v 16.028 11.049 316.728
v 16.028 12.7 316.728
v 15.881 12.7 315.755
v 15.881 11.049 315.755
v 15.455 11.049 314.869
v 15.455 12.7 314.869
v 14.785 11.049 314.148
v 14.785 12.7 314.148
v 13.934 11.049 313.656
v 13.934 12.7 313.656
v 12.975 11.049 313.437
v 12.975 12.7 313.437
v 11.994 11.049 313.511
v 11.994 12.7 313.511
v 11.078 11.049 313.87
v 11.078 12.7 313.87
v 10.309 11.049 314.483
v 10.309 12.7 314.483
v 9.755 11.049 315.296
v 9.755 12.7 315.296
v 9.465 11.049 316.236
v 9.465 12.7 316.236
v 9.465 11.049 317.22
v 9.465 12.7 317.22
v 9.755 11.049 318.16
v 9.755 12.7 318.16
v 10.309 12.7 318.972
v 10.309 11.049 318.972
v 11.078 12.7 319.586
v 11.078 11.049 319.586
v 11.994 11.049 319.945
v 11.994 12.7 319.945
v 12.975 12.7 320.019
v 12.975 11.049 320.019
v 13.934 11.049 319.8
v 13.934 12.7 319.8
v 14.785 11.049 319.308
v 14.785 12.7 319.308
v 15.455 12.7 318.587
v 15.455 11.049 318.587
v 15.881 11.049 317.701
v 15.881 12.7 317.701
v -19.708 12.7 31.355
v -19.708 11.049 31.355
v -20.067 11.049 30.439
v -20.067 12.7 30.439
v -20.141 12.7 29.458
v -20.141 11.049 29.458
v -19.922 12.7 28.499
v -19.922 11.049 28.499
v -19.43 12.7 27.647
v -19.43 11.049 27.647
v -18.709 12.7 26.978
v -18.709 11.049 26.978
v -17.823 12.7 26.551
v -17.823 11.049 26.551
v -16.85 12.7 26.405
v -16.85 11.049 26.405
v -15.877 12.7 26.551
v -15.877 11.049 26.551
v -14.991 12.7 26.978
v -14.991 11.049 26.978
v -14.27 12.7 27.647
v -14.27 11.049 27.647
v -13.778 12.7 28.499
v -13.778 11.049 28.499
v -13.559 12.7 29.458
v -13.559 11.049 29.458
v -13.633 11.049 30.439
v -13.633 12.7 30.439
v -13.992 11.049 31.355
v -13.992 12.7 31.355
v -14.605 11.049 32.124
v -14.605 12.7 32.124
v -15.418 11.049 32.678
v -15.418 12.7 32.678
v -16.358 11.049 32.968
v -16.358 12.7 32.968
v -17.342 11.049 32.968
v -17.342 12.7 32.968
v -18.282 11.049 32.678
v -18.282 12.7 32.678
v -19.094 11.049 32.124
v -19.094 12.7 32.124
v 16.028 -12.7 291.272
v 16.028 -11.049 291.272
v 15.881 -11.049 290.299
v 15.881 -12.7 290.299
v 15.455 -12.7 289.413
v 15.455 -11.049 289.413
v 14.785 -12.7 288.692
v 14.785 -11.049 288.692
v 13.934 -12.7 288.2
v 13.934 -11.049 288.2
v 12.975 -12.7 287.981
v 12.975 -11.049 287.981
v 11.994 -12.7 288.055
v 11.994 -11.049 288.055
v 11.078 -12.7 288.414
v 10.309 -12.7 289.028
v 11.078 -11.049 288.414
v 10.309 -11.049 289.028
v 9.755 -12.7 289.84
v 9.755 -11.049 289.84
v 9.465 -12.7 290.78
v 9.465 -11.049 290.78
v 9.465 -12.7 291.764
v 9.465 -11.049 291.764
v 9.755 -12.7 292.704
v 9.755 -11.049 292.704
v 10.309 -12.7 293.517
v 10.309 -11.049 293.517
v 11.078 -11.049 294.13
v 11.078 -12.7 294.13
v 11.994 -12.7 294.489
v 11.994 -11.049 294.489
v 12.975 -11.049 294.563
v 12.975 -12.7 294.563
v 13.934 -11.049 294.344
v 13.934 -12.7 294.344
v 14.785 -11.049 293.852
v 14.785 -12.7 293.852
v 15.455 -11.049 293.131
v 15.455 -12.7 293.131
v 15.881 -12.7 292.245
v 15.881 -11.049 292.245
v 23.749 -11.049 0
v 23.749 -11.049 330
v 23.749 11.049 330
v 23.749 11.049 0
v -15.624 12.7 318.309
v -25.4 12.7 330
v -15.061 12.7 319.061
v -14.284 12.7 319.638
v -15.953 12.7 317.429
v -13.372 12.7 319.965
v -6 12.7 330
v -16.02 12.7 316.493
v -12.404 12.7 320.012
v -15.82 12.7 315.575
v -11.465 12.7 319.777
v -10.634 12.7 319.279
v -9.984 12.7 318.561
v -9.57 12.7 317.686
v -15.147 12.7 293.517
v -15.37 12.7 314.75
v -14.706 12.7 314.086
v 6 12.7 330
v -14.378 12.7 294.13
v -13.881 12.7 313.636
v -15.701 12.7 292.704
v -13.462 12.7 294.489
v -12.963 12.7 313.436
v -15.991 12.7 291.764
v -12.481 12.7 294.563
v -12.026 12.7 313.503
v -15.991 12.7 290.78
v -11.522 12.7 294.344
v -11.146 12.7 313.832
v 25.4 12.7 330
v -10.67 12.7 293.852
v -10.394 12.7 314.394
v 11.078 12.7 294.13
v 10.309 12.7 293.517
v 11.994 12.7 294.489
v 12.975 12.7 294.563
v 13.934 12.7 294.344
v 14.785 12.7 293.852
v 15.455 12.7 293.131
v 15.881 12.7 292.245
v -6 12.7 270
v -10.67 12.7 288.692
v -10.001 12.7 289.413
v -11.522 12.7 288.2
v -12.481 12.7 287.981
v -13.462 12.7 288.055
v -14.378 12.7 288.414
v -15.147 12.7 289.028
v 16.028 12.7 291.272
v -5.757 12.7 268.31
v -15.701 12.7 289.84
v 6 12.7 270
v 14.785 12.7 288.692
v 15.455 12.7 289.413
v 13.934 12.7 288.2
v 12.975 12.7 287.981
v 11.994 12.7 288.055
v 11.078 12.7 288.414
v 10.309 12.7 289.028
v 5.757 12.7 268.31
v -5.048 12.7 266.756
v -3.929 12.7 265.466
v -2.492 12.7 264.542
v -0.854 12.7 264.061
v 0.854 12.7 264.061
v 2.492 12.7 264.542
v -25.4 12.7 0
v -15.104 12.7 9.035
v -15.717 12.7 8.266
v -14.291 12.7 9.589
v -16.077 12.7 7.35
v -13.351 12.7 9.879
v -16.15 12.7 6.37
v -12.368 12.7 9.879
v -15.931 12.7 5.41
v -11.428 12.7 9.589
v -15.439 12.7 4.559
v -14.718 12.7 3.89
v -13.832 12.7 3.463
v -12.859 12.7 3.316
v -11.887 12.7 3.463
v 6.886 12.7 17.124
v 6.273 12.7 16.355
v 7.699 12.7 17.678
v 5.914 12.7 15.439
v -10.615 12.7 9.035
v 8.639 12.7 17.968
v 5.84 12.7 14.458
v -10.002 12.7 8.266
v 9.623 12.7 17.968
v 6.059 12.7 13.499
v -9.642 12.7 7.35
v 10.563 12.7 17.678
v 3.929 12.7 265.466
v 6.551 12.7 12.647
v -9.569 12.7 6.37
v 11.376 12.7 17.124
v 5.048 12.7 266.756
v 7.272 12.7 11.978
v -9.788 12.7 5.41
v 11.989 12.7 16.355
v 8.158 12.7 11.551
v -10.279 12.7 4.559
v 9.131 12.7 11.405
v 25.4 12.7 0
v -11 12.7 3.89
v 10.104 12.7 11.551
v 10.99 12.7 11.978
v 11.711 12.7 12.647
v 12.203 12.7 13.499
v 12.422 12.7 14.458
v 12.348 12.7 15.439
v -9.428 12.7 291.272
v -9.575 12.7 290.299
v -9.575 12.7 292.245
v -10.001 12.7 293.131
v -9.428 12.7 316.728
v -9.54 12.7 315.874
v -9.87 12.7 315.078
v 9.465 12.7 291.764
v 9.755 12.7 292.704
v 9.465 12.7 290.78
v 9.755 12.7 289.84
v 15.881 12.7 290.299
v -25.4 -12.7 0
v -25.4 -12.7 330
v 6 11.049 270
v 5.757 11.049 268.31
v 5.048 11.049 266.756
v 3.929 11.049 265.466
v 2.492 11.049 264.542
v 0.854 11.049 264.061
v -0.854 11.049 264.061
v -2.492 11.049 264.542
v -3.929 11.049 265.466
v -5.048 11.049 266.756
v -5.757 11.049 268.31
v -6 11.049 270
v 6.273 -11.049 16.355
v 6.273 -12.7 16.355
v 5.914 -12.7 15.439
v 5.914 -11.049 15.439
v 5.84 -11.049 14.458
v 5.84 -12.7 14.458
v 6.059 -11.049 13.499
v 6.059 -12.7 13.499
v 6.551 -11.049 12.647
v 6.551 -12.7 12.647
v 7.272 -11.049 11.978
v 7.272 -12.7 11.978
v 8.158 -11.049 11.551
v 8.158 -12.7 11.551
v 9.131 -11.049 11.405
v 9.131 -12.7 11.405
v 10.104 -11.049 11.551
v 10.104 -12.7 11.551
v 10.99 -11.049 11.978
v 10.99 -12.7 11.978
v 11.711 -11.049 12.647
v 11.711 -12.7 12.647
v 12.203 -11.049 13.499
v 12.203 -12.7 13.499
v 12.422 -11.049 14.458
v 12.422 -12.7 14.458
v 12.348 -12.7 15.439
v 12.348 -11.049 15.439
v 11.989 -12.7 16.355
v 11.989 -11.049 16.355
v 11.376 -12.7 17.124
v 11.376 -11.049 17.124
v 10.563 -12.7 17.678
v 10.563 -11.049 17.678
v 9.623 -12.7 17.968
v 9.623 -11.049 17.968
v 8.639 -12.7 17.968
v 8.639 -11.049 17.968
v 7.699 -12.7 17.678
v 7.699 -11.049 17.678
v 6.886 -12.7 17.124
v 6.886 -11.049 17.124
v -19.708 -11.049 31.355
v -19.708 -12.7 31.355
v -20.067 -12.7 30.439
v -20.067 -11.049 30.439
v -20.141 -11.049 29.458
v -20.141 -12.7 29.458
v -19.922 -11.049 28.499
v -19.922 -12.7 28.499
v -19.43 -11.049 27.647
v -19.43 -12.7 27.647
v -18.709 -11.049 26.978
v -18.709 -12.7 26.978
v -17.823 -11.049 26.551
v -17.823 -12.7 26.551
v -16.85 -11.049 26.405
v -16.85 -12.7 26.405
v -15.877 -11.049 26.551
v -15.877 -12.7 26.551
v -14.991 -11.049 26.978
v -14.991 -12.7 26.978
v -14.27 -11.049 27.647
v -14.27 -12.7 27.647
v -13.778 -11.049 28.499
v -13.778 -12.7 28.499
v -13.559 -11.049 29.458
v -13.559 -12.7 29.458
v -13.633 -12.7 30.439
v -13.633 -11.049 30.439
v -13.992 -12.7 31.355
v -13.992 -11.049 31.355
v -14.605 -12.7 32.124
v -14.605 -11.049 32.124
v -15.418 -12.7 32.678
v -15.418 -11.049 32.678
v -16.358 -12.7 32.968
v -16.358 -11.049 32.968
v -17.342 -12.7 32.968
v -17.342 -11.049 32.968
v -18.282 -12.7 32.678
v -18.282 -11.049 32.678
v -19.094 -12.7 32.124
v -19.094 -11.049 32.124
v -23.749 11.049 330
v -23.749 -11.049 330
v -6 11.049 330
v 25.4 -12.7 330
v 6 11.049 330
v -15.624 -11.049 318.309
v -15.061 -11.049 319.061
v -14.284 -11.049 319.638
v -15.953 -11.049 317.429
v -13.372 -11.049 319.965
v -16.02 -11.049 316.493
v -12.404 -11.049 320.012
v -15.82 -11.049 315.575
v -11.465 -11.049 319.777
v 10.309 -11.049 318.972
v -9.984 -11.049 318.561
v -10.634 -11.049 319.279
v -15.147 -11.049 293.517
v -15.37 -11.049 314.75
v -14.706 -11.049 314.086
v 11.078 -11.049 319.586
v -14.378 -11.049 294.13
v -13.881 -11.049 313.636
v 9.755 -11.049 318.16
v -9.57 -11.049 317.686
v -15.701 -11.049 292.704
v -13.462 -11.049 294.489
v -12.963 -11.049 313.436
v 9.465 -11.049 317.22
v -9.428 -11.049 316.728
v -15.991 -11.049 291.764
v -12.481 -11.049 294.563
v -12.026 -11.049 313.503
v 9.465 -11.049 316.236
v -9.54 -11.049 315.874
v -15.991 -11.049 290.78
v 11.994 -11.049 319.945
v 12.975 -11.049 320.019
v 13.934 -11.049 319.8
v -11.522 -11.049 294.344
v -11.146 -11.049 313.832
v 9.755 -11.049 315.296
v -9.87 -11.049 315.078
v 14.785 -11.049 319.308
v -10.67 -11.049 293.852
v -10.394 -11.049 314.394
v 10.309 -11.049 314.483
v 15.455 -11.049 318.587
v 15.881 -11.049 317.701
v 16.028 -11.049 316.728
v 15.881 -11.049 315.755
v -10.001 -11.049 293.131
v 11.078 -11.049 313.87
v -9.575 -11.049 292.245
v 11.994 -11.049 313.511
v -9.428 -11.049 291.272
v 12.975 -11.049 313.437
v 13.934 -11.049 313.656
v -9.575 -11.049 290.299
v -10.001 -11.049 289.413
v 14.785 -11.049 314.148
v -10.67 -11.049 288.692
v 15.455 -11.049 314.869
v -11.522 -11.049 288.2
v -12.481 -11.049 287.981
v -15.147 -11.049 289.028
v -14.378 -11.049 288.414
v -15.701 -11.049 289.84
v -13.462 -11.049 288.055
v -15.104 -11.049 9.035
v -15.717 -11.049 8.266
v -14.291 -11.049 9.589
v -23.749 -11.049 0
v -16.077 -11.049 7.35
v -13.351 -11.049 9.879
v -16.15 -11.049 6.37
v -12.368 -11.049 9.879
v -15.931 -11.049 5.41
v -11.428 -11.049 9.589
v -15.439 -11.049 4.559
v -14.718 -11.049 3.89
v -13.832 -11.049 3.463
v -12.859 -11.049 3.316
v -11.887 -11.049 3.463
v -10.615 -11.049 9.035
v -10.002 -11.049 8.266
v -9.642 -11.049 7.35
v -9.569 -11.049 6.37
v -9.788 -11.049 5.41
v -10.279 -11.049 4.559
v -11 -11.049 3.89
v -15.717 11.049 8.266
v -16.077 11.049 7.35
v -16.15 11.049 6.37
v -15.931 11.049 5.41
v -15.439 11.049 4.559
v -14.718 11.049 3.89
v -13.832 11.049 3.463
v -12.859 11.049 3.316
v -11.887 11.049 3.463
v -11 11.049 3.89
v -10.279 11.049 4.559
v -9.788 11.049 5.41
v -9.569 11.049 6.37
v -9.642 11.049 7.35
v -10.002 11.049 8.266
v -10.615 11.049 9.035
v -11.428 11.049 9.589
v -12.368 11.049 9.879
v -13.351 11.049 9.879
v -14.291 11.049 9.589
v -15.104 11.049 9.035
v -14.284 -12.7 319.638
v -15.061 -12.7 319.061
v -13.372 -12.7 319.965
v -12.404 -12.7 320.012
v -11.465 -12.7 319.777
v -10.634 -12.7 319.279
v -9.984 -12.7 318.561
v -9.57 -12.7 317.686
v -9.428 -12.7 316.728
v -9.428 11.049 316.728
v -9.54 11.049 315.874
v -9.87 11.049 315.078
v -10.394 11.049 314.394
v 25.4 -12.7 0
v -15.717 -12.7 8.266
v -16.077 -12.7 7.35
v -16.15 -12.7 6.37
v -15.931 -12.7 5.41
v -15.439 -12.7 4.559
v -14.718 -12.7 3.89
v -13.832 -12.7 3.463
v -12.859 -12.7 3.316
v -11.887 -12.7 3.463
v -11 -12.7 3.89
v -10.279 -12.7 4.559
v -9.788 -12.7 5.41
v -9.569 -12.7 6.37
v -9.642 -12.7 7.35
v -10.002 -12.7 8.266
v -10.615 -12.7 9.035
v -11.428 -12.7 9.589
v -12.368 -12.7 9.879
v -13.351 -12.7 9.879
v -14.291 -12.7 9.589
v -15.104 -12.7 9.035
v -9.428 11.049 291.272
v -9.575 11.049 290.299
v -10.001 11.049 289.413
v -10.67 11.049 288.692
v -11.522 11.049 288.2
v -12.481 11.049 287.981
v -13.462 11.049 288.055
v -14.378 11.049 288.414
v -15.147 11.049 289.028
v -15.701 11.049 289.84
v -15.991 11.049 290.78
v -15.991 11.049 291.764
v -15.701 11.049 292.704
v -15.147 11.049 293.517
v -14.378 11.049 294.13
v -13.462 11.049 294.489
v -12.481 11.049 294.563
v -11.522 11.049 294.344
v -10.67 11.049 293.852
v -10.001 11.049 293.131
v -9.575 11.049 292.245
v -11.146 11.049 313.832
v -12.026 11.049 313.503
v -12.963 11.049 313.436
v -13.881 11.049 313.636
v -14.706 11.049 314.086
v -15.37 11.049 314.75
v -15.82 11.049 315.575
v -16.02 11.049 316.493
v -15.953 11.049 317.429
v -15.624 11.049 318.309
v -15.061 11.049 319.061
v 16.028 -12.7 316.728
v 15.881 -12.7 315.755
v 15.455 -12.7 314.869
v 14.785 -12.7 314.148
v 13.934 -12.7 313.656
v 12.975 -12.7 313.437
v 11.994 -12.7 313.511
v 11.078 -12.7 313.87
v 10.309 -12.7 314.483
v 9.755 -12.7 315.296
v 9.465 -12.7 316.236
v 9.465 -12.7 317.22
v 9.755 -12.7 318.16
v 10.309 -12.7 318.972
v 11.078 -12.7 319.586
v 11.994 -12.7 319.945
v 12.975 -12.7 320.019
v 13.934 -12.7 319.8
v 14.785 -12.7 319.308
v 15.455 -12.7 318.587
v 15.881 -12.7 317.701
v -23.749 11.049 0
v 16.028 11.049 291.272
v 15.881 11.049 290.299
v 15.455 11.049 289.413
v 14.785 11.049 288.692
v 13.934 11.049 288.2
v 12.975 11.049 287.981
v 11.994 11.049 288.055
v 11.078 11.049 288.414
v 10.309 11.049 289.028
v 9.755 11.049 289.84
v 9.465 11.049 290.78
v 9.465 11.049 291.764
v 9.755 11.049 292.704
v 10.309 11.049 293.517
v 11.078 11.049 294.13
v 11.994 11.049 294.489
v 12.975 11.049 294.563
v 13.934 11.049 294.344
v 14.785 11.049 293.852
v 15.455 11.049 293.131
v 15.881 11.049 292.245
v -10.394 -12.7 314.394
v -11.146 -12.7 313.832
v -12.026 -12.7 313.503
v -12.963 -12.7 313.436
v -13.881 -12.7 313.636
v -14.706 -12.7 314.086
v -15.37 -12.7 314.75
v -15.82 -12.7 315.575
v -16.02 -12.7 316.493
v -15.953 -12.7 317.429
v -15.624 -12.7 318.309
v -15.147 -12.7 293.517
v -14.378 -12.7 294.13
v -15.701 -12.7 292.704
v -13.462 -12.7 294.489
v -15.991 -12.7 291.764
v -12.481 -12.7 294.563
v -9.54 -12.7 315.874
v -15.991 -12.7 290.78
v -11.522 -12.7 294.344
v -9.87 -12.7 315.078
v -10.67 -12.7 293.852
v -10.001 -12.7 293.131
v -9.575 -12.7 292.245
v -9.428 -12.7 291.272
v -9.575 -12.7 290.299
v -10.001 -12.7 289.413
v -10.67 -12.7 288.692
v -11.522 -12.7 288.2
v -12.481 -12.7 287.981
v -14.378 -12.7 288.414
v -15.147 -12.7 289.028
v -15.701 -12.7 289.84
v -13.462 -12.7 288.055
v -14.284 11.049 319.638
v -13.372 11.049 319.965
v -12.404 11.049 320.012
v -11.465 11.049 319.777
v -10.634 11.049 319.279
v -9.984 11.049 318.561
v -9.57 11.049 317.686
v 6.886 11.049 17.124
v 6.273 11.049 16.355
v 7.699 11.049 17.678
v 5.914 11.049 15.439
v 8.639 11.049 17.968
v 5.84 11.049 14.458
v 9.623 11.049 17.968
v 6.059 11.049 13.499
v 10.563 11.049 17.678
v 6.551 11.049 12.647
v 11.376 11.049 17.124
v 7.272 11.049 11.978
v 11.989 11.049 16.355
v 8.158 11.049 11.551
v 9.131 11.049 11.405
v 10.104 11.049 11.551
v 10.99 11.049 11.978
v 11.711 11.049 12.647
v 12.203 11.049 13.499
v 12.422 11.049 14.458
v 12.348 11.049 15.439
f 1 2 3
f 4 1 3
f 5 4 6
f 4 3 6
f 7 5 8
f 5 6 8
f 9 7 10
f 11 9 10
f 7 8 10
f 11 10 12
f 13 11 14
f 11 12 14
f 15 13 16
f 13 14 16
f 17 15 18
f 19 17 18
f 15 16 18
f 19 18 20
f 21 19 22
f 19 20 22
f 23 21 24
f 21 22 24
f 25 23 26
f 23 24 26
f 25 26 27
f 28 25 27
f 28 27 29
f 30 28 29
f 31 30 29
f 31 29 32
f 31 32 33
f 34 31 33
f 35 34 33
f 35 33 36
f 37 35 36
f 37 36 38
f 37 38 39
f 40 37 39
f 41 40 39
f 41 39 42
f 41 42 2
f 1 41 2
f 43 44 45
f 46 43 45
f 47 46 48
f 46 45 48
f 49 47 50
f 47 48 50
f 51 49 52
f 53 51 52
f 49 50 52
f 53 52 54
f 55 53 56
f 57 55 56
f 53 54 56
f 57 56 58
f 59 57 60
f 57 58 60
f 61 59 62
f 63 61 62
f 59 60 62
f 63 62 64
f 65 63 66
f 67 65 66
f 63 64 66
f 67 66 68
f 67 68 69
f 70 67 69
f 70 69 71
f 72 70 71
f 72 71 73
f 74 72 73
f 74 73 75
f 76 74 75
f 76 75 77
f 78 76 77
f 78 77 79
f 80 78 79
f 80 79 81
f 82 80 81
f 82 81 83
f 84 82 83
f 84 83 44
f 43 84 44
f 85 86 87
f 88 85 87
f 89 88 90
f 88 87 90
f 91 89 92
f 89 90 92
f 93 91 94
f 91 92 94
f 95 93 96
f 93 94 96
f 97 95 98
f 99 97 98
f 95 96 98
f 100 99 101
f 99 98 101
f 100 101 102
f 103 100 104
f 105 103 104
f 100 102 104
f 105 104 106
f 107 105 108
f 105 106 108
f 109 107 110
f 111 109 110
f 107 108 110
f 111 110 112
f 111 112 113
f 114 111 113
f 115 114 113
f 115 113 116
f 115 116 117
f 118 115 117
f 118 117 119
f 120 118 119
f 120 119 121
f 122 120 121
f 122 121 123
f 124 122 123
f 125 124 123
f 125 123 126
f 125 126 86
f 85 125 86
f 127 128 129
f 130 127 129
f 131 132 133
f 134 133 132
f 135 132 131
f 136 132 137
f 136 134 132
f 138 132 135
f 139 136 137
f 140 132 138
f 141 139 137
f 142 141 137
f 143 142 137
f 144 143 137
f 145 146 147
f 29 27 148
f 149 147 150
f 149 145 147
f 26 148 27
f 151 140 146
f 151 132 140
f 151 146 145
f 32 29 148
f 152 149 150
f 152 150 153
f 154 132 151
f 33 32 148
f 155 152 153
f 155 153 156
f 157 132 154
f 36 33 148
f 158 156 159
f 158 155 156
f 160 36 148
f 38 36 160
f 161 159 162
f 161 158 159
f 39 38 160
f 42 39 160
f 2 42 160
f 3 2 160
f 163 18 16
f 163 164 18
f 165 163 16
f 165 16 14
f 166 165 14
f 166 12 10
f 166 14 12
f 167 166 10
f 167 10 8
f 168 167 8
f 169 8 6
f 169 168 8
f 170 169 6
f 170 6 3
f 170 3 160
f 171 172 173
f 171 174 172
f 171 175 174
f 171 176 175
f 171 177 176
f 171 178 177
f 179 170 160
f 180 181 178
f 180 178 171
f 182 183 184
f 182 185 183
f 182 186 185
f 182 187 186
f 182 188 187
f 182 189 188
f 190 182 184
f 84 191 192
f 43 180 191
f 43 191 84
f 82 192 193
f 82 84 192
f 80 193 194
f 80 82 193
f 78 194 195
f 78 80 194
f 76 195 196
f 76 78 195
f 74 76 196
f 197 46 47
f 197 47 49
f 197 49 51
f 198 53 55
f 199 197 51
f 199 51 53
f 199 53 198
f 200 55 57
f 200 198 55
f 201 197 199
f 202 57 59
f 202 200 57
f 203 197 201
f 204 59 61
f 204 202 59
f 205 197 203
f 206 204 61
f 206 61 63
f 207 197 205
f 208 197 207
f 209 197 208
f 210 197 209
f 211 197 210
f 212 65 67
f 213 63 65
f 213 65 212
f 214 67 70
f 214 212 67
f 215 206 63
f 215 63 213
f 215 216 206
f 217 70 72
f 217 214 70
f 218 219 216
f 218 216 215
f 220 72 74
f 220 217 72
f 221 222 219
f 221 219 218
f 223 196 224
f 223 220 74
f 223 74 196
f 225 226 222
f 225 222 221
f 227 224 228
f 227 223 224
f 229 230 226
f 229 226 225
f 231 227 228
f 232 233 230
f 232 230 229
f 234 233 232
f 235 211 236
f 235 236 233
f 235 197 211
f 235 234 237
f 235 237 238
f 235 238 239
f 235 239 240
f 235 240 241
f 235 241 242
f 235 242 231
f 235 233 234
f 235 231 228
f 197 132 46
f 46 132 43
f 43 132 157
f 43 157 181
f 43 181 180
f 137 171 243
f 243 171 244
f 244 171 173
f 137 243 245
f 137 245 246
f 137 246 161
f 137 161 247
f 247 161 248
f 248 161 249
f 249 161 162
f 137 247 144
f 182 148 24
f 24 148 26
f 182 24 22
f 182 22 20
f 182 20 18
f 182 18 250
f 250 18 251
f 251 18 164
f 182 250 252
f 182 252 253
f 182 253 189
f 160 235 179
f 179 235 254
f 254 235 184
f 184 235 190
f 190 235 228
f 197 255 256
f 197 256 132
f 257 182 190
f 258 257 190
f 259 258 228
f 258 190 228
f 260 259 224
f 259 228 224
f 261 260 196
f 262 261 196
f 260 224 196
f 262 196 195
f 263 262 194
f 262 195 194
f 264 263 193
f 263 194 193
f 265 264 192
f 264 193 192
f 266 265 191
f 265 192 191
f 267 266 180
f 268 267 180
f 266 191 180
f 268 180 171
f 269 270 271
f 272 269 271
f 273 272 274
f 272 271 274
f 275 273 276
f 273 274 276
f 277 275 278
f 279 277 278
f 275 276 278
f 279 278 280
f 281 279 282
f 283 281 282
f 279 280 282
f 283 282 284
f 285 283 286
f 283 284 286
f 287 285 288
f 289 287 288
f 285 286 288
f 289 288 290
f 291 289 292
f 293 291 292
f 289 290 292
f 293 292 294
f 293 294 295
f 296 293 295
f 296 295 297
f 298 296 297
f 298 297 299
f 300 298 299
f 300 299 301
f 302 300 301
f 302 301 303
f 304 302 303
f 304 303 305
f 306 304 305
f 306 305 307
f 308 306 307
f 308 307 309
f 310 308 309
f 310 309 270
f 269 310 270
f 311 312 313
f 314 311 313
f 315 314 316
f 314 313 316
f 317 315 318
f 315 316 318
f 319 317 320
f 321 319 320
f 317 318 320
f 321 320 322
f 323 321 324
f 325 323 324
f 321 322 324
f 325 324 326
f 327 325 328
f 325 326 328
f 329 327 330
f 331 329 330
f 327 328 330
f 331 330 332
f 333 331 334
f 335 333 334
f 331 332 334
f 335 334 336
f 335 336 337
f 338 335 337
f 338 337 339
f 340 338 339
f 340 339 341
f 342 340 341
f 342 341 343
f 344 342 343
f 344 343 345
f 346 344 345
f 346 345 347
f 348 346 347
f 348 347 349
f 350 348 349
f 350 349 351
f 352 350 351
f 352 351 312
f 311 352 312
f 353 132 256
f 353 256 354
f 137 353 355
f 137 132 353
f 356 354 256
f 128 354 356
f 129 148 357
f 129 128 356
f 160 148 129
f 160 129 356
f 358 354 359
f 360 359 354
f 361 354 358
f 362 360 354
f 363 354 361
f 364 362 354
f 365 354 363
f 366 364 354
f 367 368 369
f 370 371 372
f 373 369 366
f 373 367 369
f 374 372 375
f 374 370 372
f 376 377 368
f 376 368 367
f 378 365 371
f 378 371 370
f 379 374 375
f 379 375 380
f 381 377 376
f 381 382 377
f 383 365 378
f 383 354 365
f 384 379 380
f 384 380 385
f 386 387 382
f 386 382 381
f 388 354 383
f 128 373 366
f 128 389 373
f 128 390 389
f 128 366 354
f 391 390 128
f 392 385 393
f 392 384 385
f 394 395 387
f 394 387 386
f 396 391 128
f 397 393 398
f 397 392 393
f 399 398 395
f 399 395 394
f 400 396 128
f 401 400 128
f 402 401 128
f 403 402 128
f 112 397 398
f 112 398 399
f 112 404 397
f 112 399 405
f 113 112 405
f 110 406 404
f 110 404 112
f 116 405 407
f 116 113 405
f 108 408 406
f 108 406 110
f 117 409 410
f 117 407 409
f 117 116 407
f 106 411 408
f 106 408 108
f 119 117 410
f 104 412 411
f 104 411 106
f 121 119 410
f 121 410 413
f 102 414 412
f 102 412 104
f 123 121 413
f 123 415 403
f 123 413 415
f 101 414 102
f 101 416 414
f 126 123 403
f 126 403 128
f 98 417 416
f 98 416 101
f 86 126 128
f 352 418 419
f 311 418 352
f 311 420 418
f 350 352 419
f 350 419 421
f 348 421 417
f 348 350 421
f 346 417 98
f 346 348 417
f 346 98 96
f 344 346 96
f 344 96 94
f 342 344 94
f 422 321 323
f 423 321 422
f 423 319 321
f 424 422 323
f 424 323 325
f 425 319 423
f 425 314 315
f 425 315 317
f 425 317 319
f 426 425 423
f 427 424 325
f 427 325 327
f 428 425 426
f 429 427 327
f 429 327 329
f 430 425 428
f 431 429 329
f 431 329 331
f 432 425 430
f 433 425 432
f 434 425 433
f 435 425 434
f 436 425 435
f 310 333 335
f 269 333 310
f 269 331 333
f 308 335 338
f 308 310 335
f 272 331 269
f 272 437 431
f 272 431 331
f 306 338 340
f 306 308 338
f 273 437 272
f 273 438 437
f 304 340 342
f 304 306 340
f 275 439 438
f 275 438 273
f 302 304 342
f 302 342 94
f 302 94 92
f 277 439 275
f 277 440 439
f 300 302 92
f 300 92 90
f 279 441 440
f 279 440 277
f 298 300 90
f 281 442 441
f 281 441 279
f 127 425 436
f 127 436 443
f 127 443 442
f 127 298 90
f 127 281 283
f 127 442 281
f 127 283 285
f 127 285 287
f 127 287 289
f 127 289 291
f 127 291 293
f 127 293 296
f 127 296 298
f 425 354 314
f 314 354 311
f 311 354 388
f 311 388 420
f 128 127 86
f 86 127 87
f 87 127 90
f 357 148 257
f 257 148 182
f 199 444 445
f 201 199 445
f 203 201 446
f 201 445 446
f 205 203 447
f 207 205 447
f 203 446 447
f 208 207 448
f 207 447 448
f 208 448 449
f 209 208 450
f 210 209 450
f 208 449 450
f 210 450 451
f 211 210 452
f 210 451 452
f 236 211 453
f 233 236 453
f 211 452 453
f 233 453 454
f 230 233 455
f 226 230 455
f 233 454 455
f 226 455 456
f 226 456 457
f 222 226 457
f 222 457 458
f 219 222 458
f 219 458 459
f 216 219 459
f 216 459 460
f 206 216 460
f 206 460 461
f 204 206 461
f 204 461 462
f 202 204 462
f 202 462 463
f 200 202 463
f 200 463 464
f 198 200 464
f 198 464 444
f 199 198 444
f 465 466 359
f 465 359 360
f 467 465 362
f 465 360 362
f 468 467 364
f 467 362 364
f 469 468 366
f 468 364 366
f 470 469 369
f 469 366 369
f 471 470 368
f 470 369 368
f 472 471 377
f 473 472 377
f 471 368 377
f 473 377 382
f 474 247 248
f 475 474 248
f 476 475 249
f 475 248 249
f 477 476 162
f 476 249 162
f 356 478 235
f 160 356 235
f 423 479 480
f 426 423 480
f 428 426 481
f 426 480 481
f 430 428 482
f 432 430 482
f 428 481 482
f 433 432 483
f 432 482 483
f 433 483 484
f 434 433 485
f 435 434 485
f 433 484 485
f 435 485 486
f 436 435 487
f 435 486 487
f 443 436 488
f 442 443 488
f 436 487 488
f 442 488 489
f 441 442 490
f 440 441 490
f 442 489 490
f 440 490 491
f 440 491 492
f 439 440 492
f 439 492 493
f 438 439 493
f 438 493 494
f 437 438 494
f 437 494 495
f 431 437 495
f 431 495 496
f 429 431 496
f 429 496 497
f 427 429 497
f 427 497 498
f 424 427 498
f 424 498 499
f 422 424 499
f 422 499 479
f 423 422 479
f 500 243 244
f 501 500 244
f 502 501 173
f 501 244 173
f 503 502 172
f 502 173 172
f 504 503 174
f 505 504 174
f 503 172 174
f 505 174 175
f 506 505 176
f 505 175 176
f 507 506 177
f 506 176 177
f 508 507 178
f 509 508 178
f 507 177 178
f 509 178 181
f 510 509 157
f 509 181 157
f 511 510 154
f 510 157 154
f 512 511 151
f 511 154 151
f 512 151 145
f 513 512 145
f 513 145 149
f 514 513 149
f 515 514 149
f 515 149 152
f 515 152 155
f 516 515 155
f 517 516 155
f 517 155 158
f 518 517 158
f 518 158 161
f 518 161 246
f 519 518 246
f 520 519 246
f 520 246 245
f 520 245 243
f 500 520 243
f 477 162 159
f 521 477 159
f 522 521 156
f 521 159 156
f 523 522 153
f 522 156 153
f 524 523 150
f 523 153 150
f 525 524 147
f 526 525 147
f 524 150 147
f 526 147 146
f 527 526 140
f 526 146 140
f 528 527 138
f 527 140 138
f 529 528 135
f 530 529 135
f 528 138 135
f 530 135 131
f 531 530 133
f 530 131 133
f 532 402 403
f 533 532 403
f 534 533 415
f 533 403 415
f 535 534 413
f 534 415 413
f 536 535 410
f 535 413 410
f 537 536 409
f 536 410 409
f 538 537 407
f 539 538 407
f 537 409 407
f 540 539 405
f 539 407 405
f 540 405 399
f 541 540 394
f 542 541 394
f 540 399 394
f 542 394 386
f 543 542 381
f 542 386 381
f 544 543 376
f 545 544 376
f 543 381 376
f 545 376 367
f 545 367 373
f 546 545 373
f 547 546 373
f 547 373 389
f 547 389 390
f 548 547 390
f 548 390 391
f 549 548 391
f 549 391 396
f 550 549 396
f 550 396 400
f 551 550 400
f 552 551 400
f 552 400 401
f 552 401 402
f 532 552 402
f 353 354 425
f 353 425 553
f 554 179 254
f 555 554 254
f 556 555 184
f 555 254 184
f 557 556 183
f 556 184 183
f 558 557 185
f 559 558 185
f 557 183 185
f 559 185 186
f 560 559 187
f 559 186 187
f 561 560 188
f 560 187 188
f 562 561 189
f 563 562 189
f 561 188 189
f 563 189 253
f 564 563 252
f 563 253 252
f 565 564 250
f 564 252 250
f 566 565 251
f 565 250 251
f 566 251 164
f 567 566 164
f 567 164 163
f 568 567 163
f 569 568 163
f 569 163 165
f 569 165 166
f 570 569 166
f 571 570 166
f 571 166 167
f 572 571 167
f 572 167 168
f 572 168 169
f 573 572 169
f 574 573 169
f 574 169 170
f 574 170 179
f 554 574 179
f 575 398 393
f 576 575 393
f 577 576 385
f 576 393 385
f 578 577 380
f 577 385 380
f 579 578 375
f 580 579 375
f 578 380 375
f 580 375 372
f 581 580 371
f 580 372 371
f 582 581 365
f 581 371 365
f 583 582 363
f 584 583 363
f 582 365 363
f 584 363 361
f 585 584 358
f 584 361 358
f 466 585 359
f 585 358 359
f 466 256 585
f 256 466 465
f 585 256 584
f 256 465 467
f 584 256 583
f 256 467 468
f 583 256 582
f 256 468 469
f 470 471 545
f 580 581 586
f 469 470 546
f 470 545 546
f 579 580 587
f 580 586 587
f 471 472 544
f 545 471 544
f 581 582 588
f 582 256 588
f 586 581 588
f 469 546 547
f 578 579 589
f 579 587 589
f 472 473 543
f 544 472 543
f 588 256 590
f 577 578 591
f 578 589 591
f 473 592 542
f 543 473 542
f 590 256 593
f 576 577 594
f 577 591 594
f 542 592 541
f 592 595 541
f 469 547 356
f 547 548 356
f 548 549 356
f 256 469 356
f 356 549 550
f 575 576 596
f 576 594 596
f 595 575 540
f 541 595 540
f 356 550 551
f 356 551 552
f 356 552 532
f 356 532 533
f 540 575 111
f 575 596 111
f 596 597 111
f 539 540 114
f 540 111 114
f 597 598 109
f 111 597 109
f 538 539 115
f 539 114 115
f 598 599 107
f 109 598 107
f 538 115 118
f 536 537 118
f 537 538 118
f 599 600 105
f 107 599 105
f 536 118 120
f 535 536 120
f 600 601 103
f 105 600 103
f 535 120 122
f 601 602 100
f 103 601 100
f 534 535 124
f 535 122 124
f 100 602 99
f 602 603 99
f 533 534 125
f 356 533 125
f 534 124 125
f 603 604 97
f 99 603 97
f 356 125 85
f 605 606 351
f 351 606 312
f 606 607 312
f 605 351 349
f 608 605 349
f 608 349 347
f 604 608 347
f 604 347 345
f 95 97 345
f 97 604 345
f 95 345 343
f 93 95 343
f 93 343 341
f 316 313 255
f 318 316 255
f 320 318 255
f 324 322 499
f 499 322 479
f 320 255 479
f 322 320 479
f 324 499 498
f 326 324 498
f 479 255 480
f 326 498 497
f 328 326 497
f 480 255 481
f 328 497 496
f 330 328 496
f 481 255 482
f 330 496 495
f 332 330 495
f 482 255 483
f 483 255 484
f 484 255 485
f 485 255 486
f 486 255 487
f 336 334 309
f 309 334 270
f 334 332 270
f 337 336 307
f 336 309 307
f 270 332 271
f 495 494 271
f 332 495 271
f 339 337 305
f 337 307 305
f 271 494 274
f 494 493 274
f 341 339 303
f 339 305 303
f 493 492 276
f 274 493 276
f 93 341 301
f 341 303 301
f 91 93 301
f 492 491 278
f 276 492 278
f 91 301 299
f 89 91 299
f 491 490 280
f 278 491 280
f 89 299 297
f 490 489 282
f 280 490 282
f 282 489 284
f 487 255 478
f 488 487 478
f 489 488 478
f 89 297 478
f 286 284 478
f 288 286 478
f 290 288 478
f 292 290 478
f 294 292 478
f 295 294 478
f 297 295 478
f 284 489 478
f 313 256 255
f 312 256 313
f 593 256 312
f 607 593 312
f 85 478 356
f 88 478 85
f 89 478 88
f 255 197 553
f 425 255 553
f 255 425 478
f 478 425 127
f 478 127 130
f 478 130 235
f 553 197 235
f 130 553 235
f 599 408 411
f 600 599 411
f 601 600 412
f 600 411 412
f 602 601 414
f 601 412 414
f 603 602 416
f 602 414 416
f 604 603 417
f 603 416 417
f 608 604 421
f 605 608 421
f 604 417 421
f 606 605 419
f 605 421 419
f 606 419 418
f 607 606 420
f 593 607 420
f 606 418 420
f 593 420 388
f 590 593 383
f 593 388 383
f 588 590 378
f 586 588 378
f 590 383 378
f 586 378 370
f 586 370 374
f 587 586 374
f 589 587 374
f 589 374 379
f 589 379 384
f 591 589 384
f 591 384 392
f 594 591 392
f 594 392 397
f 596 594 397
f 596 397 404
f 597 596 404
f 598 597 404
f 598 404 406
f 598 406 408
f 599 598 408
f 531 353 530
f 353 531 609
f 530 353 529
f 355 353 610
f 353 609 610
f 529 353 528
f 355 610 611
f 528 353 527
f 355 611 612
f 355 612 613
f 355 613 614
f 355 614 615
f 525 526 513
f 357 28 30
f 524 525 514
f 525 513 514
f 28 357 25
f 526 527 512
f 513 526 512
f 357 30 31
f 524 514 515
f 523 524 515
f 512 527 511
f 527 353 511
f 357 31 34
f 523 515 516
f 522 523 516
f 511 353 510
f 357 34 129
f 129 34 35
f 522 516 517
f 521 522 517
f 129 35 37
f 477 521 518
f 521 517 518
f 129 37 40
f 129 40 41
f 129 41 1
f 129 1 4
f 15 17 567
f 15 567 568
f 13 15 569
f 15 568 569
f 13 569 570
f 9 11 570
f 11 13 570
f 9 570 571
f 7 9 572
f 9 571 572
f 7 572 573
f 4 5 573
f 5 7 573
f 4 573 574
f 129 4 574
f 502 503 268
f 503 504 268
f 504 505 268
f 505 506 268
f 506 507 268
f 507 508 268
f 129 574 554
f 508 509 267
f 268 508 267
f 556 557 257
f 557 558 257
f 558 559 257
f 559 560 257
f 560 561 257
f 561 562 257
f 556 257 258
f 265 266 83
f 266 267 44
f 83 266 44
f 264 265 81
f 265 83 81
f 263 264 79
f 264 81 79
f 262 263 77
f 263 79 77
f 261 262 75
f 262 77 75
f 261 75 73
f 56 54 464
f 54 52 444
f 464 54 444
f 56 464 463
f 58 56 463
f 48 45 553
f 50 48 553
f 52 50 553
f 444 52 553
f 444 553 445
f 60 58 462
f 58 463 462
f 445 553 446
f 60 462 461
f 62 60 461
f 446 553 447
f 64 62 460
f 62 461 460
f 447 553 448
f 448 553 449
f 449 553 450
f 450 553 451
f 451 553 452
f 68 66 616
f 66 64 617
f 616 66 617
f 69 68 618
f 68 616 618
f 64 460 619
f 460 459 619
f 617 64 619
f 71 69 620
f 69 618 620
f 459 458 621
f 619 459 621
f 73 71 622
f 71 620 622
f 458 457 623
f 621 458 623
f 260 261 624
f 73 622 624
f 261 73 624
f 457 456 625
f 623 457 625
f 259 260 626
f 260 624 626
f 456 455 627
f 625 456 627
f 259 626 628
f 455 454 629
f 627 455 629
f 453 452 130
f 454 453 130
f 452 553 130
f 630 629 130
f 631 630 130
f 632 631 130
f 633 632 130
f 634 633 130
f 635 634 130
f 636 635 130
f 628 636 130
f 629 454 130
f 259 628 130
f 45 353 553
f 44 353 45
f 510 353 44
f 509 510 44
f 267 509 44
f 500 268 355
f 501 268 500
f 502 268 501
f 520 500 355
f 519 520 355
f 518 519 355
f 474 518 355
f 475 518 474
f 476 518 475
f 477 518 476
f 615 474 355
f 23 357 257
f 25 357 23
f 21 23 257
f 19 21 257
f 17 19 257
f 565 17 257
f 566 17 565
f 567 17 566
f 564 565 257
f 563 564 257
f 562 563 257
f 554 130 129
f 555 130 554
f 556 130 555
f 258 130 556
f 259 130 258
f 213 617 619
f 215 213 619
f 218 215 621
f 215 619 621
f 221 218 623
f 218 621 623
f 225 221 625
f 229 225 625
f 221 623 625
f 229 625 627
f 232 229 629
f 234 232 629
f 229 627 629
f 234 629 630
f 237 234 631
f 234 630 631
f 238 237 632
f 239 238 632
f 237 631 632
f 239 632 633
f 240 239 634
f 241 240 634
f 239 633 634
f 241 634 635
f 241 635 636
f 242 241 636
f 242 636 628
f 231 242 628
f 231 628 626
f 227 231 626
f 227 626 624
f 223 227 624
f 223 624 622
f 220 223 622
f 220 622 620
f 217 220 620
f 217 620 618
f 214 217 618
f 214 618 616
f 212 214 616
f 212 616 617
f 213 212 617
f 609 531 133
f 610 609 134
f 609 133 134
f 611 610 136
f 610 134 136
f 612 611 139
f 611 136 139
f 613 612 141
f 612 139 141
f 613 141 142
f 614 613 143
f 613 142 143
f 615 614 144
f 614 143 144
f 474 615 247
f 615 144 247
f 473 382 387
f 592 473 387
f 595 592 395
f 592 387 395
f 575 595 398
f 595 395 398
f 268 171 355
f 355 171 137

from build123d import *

# Parameters (mm, degrees)
SKETCH1_W              = 50.8
SKETCH1_H              = 25.4
SKETCH1_W_2            = 47.498
SKETCH1_H_2            = 22.098
BOSS_EXTRUDE1_DEPTH    = 330
CUT_EXTRUDE5_REACH     = 27.4
SKETCH8_R              = 3.3
CUT_EXTRUDE6_DEPTH     = 26.4
F_00_CLEARANCE_HOLE1_D = 6.600000008


with BuildPart() as part:
    # Sketch1 → Boss-Extrude1 (new body)
    with BuildSketch(Plane.XY):
        Rectangle(SKETCH1_W, SKETCH1_H)
        Rectangle(SKETCH1_W_2, SKETCH1_H_2, mode=Mode.SUBTRACT)
    extrude(amount=BOSS_EXTRUDE1_DEPTH)

    # Sketch4 → Cut-Extrude5 (cut, up to next)
    with BuildSketch(Plane(origin=(0, 12.7, 0), x_dir=(1, 0, 0), z_dir=(0, 1, 0)), mode=Mode.PRIVATE) as cut_extrude5_sk1:
        with BuildLine():
            Line((-6, -270), (-6, -330))
            Line((-6, -330), (6, -330))
            Line((6, -330), (6, -270))
            ThreePointArc((6, -270), (0, -264), (-6, -270))
        make_face()
    cut_extrude5_tool1 = extrude(cut_extrude5_sk1.sketch, amount=-CUT_EXTRUDE5_REACH, mode=Mode.PRIVATE) & part.part
    add(cut_extrude5_tool1.solids().sort_by_distance((0, 12.7, 297.629949))[0], mode=Mode.SUBTRACT)

    # Sketch8 → Cut-Extrude6 (cut, through all)
    with BuildSketch(Plane(origin=(0, 12.7, 0), x_dir=(1, 0, 0), z_dir=(0, 1, 0))):
        with BuildLine():
            ThreePointArc((-9.427922061, -316.727922061), (-9.679119604, -315.465066735), (-10.394469683, -314.394469683))
            Line((-10.394469683, -314.394469683), (-15.061374439, -319.061374439))
            ThreePointArc((-15.061374439, -319.061374439), (-11.465066735, -319.776724519), (-9.427922061, -316.727922061))
        make_face()
        with BuildLine():
            Line((-15.061374439, -319.061374439), (-10.394469683, -314.394469683))
            ThreePointArc((-10.394469683, -314.394469683), (-15.061374439, -314.394469683), (-15.061374439, -319.061374439))
        make_face()
        with Locations((-12.727922061, -291.272077939)):
            Circle(SKETCH8_R)
        with Locations((12.727922061, -291.272077939)):
            Circle(SKETCH8_R)
        with Locations((12.727922061, -316.727922061)):
            Circle(SKETCH8_R)
    extrude(amount=-CUT_EXTRUDE6_DEPTH, mode=Mode.SUBTRACT)

    # #00 Clearance Hole1 (through all)
    with Locations(Plane(origin=(136.368987279, 20.7, -48.715791339), x_dir=(0.866025404, 0, -0.5), z_dir=(0, 1, 0))):
        with Locations((-156.901570158, 26.695380774), (-141.901570158, 8.695380774), (-171.901570158, 8.695380774)):
            Hole(F_00_CLEARANCE_HOLE1_D / 2)


solid = part.part
